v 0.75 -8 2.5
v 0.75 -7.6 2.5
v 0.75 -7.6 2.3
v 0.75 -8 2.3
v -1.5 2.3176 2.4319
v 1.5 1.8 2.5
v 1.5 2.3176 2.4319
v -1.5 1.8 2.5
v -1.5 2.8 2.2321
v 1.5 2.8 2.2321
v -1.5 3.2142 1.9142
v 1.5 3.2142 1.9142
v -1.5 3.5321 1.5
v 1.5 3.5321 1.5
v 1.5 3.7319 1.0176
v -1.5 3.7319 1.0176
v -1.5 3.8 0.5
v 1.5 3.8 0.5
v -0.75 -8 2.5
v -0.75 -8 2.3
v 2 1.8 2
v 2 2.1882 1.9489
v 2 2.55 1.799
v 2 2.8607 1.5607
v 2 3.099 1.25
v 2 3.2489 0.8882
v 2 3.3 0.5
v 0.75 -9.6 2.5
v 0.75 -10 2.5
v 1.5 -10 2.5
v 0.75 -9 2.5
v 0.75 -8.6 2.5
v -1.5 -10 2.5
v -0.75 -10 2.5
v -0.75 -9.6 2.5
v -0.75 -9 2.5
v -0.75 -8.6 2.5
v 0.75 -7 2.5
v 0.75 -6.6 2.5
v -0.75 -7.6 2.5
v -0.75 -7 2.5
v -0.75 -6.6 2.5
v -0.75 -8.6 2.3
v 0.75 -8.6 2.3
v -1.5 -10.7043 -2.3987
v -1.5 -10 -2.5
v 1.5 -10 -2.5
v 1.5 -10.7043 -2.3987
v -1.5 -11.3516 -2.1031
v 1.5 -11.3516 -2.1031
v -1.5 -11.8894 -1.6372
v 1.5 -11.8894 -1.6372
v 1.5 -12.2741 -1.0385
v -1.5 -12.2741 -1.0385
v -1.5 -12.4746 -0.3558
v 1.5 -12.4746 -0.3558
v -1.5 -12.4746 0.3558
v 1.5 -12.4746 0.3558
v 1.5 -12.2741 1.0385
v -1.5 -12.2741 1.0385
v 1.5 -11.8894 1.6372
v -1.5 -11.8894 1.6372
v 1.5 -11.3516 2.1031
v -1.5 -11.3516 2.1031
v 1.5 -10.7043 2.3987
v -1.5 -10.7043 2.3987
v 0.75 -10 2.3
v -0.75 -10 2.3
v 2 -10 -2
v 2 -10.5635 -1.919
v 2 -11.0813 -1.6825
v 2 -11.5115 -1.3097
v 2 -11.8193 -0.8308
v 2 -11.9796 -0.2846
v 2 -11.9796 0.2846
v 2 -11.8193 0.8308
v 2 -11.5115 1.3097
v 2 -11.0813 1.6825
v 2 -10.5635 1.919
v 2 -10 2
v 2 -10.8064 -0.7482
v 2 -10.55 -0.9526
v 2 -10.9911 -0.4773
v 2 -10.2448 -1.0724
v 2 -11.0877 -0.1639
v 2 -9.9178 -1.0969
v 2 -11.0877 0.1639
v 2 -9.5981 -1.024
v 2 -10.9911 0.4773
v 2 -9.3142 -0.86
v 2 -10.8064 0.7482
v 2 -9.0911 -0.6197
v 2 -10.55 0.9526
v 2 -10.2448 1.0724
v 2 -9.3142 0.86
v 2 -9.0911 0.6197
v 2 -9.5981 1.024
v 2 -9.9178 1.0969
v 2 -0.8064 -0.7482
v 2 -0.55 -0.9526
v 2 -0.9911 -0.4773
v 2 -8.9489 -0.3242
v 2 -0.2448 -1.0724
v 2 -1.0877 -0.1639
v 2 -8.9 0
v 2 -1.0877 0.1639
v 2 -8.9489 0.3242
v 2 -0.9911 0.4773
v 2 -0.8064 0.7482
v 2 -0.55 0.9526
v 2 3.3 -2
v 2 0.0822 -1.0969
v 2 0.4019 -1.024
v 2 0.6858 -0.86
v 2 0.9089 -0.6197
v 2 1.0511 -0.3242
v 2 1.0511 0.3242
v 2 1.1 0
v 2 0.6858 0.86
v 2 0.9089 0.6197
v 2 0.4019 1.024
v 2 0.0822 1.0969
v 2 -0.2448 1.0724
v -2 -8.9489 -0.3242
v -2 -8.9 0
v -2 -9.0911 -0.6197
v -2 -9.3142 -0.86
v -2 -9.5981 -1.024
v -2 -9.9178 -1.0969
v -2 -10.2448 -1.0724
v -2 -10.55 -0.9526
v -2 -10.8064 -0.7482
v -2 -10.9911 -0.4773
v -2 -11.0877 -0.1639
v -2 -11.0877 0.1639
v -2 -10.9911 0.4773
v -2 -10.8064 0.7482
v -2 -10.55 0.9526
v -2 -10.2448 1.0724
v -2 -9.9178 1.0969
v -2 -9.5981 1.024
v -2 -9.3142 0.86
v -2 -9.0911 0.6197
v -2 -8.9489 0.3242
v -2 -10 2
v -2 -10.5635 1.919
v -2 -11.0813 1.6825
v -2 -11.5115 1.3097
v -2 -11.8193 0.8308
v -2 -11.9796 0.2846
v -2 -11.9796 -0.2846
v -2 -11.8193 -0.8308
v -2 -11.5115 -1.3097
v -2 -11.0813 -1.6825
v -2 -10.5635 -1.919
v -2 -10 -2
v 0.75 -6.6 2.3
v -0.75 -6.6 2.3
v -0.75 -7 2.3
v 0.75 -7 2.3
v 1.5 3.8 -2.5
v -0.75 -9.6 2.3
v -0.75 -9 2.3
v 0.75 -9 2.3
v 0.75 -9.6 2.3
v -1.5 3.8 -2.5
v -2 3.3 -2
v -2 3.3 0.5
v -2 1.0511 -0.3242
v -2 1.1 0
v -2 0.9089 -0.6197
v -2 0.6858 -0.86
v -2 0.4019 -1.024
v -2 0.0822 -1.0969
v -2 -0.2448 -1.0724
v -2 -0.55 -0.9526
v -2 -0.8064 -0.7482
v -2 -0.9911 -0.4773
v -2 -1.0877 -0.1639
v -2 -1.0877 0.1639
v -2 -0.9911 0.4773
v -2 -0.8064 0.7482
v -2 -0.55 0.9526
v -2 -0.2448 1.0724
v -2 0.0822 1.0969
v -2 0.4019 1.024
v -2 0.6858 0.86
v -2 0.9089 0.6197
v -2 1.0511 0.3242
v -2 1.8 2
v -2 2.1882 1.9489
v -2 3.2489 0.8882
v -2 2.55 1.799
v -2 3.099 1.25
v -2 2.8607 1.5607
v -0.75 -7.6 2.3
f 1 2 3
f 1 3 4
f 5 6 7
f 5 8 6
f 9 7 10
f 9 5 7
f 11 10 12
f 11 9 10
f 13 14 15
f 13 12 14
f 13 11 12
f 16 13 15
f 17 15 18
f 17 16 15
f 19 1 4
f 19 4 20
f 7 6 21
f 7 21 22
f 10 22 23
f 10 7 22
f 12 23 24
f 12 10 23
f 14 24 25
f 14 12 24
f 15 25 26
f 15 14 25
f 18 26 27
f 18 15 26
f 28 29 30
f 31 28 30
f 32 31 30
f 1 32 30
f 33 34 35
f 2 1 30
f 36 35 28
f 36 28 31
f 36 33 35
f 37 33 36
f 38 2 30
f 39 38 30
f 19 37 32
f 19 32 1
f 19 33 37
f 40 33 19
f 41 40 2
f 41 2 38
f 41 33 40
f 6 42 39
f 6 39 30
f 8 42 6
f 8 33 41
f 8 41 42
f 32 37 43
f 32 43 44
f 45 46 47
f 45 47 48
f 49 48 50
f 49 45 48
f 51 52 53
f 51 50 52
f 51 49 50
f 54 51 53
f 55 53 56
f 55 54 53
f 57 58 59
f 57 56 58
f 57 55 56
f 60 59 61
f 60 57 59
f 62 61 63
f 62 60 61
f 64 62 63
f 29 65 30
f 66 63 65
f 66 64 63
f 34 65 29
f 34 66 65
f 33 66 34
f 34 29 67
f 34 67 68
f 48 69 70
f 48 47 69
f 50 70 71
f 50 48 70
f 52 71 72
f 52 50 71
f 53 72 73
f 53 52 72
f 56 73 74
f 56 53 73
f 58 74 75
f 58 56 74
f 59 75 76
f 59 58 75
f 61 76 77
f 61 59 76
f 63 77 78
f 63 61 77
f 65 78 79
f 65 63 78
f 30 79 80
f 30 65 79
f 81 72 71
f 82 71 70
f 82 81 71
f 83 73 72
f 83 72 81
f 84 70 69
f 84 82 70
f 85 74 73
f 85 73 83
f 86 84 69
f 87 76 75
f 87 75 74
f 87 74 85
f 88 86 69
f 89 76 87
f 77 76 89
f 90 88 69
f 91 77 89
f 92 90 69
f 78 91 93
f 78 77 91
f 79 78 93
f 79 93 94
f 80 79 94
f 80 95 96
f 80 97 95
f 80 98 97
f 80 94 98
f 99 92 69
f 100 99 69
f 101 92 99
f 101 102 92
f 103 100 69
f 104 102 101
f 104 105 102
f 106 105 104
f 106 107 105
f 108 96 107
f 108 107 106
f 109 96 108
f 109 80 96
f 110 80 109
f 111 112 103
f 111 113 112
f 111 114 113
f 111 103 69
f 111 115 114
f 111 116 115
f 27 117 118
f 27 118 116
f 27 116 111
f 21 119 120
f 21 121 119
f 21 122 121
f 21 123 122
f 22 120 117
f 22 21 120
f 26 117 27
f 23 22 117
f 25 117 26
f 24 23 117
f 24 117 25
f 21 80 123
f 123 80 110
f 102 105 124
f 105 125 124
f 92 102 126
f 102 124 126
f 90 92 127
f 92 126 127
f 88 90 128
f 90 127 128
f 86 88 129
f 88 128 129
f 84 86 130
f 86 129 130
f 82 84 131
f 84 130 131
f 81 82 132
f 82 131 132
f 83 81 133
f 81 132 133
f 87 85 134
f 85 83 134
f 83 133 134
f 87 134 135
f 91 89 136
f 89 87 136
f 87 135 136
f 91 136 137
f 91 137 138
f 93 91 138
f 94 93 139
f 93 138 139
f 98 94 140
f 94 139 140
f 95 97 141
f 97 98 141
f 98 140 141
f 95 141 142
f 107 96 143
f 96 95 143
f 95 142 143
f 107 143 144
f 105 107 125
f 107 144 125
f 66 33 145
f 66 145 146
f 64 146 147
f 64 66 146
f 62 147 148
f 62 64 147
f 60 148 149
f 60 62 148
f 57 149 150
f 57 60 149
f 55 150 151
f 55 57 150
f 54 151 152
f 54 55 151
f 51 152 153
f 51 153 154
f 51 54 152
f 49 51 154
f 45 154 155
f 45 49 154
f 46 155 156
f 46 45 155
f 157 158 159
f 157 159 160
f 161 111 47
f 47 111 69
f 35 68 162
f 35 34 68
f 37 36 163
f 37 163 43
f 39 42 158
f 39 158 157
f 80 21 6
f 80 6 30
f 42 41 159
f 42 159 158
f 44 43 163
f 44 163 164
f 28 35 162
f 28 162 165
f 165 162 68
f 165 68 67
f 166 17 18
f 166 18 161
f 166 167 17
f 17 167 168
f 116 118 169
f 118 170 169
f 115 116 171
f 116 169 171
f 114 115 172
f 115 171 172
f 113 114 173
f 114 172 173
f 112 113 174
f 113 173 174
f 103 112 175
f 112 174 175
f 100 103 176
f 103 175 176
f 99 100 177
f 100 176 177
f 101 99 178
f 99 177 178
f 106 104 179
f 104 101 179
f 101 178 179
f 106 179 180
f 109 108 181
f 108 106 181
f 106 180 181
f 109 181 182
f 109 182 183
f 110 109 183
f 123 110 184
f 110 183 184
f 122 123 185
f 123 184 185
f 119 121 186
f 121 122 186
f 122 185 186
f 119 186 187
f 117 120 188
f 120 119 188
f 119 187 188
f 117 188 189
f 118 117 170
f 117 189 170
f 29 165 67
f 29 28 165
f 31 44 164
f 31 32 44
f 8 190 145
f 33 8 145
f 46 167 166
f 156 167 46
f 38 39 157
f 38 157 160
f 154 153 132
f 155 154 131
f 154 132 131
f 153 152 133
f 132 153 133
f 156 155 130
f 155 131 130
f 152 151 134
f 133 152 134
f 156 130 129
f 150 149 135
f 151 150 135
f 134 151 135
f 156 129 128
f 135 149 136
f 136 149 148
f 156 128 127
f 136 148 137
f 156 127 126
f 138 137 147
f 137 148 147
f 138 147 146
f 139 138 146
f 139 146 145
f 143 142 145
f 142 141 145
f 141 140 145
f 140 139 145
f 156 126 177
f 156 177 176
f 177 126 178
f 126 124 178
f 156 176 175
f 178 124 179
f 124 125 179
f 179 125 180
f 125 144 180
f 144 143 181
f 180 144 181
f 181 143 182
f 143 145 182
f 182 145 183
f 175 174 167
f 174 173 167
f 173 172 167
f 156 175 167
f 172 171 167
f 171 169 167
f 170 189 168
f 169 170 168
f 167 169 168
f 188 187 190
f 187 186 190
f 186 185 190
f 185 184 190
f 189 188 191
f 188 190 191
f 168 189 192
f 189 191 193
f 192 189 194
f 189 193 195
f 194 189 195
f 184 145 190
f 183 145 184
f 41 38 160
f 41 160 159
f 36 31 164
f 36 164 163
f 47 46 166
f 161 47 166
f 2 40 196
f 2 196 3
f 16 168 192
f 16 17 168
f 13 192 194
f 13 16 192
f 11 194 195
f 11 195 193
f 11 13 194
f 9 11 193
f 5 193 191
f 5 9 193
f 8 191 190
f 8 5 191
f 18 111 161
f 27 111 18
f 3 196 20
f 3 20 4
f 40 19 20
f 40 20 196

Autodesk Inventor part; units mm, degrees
ref_plane "YZ Plane" through (0, 0, 0) normal (1, 0, 0) x (0, 1, 0)
ref_plane "XZ Plane" through (0, 0, 0) normal (0, 1, 0) x (-1, 0, 0)
ref_plane "XY Plane" through (0, 0, 0) normal (0, 0, 1) x (1, 0, 0)
sketch "Skizze1" plane through (0, 0, 0) normal (1, 0, 0) x (0, 1, 0)
  line L0 (0, 0) -> (-10, 0) construction
  circle A0 centre (0, 0) radius 1.1
  circle A1 centre (-10, 0) radius 1.1
  arc A2 (-10, 2.5) -> (-10, -2.5) centre (-10, 0) ccw
  line L1 (-10, -2.5) -> (3.8, -2.5)
  line L2 (-10, 2.5) -> (1.8, 2.5)
  arc A3 (3.8, 0.5) -> (1.8, 2.5) centre (1.8, 0.5) ccw
  line L3 (3.8, 0.5) -> (3.8, -2.5)
  dimension "d0" = 10
  dimension "d1" = 2.2
  dimension "d2" = 2.2
  dimension "d3" = 2.5
  dimension "d8" = 2
  dimension "d9" = 3.8
extrude "Extrusion1" add sketch "Skizze1" along normal mid plane 4
chamfer "Fase1" distance 0.5 angle 45 10 edges at (2, 3.2142, 1.9142) (2, -4.1, 2.5) (2, -12.5, 0) (2, -3.1, -2.5) (2, 3.8, -1) (-2, 3.2142, 1.9142) (-2, -4.1, 2.5) (-2, -12.5, 0) (-2, -3.1, -2.5) (-2, 3.8, -1)
sketch "Skizze4" plane through (-1.5, -10, 2.5) normal (0, 0, 1) x (1, 0, 0)
  line L0 (1.5, 17.06) -> (1.5, -5.76) construction
  line L1 (0, 0) -> (3, 0) construction
  line L2 (0.75, 0.4) -> (2.25, 0.4)
  line L3 (2.25, 0.4) -> (2.25, 0)
  line L4 (2.25, 0) -> (0.75, 0)
  line L5 (0.75, 0) -> (0.75, 0.4)
  line L6 (0.75, 0.4) -> (2.25, 0) construction
  line L7 (2.25, 0.4) -> (0.75, 0) construction
  point P0 (1.5, 10)
  point P1 (1.5, 0.2)
  point P2 (1.5, 0)
  dimension "d23" = 0.4
  dimension "d24" = 1.5
extrude "Extrusion3" cut sketch "Skizze4" against normal blind 0.2
pattern_linear "Rechteckige Anordnung1" count 4 spacing 1 along (0, 1, 0) of "Extrusion3"
equation "\"d2\" = d1"
properties part number "Chipanschlag T2"
